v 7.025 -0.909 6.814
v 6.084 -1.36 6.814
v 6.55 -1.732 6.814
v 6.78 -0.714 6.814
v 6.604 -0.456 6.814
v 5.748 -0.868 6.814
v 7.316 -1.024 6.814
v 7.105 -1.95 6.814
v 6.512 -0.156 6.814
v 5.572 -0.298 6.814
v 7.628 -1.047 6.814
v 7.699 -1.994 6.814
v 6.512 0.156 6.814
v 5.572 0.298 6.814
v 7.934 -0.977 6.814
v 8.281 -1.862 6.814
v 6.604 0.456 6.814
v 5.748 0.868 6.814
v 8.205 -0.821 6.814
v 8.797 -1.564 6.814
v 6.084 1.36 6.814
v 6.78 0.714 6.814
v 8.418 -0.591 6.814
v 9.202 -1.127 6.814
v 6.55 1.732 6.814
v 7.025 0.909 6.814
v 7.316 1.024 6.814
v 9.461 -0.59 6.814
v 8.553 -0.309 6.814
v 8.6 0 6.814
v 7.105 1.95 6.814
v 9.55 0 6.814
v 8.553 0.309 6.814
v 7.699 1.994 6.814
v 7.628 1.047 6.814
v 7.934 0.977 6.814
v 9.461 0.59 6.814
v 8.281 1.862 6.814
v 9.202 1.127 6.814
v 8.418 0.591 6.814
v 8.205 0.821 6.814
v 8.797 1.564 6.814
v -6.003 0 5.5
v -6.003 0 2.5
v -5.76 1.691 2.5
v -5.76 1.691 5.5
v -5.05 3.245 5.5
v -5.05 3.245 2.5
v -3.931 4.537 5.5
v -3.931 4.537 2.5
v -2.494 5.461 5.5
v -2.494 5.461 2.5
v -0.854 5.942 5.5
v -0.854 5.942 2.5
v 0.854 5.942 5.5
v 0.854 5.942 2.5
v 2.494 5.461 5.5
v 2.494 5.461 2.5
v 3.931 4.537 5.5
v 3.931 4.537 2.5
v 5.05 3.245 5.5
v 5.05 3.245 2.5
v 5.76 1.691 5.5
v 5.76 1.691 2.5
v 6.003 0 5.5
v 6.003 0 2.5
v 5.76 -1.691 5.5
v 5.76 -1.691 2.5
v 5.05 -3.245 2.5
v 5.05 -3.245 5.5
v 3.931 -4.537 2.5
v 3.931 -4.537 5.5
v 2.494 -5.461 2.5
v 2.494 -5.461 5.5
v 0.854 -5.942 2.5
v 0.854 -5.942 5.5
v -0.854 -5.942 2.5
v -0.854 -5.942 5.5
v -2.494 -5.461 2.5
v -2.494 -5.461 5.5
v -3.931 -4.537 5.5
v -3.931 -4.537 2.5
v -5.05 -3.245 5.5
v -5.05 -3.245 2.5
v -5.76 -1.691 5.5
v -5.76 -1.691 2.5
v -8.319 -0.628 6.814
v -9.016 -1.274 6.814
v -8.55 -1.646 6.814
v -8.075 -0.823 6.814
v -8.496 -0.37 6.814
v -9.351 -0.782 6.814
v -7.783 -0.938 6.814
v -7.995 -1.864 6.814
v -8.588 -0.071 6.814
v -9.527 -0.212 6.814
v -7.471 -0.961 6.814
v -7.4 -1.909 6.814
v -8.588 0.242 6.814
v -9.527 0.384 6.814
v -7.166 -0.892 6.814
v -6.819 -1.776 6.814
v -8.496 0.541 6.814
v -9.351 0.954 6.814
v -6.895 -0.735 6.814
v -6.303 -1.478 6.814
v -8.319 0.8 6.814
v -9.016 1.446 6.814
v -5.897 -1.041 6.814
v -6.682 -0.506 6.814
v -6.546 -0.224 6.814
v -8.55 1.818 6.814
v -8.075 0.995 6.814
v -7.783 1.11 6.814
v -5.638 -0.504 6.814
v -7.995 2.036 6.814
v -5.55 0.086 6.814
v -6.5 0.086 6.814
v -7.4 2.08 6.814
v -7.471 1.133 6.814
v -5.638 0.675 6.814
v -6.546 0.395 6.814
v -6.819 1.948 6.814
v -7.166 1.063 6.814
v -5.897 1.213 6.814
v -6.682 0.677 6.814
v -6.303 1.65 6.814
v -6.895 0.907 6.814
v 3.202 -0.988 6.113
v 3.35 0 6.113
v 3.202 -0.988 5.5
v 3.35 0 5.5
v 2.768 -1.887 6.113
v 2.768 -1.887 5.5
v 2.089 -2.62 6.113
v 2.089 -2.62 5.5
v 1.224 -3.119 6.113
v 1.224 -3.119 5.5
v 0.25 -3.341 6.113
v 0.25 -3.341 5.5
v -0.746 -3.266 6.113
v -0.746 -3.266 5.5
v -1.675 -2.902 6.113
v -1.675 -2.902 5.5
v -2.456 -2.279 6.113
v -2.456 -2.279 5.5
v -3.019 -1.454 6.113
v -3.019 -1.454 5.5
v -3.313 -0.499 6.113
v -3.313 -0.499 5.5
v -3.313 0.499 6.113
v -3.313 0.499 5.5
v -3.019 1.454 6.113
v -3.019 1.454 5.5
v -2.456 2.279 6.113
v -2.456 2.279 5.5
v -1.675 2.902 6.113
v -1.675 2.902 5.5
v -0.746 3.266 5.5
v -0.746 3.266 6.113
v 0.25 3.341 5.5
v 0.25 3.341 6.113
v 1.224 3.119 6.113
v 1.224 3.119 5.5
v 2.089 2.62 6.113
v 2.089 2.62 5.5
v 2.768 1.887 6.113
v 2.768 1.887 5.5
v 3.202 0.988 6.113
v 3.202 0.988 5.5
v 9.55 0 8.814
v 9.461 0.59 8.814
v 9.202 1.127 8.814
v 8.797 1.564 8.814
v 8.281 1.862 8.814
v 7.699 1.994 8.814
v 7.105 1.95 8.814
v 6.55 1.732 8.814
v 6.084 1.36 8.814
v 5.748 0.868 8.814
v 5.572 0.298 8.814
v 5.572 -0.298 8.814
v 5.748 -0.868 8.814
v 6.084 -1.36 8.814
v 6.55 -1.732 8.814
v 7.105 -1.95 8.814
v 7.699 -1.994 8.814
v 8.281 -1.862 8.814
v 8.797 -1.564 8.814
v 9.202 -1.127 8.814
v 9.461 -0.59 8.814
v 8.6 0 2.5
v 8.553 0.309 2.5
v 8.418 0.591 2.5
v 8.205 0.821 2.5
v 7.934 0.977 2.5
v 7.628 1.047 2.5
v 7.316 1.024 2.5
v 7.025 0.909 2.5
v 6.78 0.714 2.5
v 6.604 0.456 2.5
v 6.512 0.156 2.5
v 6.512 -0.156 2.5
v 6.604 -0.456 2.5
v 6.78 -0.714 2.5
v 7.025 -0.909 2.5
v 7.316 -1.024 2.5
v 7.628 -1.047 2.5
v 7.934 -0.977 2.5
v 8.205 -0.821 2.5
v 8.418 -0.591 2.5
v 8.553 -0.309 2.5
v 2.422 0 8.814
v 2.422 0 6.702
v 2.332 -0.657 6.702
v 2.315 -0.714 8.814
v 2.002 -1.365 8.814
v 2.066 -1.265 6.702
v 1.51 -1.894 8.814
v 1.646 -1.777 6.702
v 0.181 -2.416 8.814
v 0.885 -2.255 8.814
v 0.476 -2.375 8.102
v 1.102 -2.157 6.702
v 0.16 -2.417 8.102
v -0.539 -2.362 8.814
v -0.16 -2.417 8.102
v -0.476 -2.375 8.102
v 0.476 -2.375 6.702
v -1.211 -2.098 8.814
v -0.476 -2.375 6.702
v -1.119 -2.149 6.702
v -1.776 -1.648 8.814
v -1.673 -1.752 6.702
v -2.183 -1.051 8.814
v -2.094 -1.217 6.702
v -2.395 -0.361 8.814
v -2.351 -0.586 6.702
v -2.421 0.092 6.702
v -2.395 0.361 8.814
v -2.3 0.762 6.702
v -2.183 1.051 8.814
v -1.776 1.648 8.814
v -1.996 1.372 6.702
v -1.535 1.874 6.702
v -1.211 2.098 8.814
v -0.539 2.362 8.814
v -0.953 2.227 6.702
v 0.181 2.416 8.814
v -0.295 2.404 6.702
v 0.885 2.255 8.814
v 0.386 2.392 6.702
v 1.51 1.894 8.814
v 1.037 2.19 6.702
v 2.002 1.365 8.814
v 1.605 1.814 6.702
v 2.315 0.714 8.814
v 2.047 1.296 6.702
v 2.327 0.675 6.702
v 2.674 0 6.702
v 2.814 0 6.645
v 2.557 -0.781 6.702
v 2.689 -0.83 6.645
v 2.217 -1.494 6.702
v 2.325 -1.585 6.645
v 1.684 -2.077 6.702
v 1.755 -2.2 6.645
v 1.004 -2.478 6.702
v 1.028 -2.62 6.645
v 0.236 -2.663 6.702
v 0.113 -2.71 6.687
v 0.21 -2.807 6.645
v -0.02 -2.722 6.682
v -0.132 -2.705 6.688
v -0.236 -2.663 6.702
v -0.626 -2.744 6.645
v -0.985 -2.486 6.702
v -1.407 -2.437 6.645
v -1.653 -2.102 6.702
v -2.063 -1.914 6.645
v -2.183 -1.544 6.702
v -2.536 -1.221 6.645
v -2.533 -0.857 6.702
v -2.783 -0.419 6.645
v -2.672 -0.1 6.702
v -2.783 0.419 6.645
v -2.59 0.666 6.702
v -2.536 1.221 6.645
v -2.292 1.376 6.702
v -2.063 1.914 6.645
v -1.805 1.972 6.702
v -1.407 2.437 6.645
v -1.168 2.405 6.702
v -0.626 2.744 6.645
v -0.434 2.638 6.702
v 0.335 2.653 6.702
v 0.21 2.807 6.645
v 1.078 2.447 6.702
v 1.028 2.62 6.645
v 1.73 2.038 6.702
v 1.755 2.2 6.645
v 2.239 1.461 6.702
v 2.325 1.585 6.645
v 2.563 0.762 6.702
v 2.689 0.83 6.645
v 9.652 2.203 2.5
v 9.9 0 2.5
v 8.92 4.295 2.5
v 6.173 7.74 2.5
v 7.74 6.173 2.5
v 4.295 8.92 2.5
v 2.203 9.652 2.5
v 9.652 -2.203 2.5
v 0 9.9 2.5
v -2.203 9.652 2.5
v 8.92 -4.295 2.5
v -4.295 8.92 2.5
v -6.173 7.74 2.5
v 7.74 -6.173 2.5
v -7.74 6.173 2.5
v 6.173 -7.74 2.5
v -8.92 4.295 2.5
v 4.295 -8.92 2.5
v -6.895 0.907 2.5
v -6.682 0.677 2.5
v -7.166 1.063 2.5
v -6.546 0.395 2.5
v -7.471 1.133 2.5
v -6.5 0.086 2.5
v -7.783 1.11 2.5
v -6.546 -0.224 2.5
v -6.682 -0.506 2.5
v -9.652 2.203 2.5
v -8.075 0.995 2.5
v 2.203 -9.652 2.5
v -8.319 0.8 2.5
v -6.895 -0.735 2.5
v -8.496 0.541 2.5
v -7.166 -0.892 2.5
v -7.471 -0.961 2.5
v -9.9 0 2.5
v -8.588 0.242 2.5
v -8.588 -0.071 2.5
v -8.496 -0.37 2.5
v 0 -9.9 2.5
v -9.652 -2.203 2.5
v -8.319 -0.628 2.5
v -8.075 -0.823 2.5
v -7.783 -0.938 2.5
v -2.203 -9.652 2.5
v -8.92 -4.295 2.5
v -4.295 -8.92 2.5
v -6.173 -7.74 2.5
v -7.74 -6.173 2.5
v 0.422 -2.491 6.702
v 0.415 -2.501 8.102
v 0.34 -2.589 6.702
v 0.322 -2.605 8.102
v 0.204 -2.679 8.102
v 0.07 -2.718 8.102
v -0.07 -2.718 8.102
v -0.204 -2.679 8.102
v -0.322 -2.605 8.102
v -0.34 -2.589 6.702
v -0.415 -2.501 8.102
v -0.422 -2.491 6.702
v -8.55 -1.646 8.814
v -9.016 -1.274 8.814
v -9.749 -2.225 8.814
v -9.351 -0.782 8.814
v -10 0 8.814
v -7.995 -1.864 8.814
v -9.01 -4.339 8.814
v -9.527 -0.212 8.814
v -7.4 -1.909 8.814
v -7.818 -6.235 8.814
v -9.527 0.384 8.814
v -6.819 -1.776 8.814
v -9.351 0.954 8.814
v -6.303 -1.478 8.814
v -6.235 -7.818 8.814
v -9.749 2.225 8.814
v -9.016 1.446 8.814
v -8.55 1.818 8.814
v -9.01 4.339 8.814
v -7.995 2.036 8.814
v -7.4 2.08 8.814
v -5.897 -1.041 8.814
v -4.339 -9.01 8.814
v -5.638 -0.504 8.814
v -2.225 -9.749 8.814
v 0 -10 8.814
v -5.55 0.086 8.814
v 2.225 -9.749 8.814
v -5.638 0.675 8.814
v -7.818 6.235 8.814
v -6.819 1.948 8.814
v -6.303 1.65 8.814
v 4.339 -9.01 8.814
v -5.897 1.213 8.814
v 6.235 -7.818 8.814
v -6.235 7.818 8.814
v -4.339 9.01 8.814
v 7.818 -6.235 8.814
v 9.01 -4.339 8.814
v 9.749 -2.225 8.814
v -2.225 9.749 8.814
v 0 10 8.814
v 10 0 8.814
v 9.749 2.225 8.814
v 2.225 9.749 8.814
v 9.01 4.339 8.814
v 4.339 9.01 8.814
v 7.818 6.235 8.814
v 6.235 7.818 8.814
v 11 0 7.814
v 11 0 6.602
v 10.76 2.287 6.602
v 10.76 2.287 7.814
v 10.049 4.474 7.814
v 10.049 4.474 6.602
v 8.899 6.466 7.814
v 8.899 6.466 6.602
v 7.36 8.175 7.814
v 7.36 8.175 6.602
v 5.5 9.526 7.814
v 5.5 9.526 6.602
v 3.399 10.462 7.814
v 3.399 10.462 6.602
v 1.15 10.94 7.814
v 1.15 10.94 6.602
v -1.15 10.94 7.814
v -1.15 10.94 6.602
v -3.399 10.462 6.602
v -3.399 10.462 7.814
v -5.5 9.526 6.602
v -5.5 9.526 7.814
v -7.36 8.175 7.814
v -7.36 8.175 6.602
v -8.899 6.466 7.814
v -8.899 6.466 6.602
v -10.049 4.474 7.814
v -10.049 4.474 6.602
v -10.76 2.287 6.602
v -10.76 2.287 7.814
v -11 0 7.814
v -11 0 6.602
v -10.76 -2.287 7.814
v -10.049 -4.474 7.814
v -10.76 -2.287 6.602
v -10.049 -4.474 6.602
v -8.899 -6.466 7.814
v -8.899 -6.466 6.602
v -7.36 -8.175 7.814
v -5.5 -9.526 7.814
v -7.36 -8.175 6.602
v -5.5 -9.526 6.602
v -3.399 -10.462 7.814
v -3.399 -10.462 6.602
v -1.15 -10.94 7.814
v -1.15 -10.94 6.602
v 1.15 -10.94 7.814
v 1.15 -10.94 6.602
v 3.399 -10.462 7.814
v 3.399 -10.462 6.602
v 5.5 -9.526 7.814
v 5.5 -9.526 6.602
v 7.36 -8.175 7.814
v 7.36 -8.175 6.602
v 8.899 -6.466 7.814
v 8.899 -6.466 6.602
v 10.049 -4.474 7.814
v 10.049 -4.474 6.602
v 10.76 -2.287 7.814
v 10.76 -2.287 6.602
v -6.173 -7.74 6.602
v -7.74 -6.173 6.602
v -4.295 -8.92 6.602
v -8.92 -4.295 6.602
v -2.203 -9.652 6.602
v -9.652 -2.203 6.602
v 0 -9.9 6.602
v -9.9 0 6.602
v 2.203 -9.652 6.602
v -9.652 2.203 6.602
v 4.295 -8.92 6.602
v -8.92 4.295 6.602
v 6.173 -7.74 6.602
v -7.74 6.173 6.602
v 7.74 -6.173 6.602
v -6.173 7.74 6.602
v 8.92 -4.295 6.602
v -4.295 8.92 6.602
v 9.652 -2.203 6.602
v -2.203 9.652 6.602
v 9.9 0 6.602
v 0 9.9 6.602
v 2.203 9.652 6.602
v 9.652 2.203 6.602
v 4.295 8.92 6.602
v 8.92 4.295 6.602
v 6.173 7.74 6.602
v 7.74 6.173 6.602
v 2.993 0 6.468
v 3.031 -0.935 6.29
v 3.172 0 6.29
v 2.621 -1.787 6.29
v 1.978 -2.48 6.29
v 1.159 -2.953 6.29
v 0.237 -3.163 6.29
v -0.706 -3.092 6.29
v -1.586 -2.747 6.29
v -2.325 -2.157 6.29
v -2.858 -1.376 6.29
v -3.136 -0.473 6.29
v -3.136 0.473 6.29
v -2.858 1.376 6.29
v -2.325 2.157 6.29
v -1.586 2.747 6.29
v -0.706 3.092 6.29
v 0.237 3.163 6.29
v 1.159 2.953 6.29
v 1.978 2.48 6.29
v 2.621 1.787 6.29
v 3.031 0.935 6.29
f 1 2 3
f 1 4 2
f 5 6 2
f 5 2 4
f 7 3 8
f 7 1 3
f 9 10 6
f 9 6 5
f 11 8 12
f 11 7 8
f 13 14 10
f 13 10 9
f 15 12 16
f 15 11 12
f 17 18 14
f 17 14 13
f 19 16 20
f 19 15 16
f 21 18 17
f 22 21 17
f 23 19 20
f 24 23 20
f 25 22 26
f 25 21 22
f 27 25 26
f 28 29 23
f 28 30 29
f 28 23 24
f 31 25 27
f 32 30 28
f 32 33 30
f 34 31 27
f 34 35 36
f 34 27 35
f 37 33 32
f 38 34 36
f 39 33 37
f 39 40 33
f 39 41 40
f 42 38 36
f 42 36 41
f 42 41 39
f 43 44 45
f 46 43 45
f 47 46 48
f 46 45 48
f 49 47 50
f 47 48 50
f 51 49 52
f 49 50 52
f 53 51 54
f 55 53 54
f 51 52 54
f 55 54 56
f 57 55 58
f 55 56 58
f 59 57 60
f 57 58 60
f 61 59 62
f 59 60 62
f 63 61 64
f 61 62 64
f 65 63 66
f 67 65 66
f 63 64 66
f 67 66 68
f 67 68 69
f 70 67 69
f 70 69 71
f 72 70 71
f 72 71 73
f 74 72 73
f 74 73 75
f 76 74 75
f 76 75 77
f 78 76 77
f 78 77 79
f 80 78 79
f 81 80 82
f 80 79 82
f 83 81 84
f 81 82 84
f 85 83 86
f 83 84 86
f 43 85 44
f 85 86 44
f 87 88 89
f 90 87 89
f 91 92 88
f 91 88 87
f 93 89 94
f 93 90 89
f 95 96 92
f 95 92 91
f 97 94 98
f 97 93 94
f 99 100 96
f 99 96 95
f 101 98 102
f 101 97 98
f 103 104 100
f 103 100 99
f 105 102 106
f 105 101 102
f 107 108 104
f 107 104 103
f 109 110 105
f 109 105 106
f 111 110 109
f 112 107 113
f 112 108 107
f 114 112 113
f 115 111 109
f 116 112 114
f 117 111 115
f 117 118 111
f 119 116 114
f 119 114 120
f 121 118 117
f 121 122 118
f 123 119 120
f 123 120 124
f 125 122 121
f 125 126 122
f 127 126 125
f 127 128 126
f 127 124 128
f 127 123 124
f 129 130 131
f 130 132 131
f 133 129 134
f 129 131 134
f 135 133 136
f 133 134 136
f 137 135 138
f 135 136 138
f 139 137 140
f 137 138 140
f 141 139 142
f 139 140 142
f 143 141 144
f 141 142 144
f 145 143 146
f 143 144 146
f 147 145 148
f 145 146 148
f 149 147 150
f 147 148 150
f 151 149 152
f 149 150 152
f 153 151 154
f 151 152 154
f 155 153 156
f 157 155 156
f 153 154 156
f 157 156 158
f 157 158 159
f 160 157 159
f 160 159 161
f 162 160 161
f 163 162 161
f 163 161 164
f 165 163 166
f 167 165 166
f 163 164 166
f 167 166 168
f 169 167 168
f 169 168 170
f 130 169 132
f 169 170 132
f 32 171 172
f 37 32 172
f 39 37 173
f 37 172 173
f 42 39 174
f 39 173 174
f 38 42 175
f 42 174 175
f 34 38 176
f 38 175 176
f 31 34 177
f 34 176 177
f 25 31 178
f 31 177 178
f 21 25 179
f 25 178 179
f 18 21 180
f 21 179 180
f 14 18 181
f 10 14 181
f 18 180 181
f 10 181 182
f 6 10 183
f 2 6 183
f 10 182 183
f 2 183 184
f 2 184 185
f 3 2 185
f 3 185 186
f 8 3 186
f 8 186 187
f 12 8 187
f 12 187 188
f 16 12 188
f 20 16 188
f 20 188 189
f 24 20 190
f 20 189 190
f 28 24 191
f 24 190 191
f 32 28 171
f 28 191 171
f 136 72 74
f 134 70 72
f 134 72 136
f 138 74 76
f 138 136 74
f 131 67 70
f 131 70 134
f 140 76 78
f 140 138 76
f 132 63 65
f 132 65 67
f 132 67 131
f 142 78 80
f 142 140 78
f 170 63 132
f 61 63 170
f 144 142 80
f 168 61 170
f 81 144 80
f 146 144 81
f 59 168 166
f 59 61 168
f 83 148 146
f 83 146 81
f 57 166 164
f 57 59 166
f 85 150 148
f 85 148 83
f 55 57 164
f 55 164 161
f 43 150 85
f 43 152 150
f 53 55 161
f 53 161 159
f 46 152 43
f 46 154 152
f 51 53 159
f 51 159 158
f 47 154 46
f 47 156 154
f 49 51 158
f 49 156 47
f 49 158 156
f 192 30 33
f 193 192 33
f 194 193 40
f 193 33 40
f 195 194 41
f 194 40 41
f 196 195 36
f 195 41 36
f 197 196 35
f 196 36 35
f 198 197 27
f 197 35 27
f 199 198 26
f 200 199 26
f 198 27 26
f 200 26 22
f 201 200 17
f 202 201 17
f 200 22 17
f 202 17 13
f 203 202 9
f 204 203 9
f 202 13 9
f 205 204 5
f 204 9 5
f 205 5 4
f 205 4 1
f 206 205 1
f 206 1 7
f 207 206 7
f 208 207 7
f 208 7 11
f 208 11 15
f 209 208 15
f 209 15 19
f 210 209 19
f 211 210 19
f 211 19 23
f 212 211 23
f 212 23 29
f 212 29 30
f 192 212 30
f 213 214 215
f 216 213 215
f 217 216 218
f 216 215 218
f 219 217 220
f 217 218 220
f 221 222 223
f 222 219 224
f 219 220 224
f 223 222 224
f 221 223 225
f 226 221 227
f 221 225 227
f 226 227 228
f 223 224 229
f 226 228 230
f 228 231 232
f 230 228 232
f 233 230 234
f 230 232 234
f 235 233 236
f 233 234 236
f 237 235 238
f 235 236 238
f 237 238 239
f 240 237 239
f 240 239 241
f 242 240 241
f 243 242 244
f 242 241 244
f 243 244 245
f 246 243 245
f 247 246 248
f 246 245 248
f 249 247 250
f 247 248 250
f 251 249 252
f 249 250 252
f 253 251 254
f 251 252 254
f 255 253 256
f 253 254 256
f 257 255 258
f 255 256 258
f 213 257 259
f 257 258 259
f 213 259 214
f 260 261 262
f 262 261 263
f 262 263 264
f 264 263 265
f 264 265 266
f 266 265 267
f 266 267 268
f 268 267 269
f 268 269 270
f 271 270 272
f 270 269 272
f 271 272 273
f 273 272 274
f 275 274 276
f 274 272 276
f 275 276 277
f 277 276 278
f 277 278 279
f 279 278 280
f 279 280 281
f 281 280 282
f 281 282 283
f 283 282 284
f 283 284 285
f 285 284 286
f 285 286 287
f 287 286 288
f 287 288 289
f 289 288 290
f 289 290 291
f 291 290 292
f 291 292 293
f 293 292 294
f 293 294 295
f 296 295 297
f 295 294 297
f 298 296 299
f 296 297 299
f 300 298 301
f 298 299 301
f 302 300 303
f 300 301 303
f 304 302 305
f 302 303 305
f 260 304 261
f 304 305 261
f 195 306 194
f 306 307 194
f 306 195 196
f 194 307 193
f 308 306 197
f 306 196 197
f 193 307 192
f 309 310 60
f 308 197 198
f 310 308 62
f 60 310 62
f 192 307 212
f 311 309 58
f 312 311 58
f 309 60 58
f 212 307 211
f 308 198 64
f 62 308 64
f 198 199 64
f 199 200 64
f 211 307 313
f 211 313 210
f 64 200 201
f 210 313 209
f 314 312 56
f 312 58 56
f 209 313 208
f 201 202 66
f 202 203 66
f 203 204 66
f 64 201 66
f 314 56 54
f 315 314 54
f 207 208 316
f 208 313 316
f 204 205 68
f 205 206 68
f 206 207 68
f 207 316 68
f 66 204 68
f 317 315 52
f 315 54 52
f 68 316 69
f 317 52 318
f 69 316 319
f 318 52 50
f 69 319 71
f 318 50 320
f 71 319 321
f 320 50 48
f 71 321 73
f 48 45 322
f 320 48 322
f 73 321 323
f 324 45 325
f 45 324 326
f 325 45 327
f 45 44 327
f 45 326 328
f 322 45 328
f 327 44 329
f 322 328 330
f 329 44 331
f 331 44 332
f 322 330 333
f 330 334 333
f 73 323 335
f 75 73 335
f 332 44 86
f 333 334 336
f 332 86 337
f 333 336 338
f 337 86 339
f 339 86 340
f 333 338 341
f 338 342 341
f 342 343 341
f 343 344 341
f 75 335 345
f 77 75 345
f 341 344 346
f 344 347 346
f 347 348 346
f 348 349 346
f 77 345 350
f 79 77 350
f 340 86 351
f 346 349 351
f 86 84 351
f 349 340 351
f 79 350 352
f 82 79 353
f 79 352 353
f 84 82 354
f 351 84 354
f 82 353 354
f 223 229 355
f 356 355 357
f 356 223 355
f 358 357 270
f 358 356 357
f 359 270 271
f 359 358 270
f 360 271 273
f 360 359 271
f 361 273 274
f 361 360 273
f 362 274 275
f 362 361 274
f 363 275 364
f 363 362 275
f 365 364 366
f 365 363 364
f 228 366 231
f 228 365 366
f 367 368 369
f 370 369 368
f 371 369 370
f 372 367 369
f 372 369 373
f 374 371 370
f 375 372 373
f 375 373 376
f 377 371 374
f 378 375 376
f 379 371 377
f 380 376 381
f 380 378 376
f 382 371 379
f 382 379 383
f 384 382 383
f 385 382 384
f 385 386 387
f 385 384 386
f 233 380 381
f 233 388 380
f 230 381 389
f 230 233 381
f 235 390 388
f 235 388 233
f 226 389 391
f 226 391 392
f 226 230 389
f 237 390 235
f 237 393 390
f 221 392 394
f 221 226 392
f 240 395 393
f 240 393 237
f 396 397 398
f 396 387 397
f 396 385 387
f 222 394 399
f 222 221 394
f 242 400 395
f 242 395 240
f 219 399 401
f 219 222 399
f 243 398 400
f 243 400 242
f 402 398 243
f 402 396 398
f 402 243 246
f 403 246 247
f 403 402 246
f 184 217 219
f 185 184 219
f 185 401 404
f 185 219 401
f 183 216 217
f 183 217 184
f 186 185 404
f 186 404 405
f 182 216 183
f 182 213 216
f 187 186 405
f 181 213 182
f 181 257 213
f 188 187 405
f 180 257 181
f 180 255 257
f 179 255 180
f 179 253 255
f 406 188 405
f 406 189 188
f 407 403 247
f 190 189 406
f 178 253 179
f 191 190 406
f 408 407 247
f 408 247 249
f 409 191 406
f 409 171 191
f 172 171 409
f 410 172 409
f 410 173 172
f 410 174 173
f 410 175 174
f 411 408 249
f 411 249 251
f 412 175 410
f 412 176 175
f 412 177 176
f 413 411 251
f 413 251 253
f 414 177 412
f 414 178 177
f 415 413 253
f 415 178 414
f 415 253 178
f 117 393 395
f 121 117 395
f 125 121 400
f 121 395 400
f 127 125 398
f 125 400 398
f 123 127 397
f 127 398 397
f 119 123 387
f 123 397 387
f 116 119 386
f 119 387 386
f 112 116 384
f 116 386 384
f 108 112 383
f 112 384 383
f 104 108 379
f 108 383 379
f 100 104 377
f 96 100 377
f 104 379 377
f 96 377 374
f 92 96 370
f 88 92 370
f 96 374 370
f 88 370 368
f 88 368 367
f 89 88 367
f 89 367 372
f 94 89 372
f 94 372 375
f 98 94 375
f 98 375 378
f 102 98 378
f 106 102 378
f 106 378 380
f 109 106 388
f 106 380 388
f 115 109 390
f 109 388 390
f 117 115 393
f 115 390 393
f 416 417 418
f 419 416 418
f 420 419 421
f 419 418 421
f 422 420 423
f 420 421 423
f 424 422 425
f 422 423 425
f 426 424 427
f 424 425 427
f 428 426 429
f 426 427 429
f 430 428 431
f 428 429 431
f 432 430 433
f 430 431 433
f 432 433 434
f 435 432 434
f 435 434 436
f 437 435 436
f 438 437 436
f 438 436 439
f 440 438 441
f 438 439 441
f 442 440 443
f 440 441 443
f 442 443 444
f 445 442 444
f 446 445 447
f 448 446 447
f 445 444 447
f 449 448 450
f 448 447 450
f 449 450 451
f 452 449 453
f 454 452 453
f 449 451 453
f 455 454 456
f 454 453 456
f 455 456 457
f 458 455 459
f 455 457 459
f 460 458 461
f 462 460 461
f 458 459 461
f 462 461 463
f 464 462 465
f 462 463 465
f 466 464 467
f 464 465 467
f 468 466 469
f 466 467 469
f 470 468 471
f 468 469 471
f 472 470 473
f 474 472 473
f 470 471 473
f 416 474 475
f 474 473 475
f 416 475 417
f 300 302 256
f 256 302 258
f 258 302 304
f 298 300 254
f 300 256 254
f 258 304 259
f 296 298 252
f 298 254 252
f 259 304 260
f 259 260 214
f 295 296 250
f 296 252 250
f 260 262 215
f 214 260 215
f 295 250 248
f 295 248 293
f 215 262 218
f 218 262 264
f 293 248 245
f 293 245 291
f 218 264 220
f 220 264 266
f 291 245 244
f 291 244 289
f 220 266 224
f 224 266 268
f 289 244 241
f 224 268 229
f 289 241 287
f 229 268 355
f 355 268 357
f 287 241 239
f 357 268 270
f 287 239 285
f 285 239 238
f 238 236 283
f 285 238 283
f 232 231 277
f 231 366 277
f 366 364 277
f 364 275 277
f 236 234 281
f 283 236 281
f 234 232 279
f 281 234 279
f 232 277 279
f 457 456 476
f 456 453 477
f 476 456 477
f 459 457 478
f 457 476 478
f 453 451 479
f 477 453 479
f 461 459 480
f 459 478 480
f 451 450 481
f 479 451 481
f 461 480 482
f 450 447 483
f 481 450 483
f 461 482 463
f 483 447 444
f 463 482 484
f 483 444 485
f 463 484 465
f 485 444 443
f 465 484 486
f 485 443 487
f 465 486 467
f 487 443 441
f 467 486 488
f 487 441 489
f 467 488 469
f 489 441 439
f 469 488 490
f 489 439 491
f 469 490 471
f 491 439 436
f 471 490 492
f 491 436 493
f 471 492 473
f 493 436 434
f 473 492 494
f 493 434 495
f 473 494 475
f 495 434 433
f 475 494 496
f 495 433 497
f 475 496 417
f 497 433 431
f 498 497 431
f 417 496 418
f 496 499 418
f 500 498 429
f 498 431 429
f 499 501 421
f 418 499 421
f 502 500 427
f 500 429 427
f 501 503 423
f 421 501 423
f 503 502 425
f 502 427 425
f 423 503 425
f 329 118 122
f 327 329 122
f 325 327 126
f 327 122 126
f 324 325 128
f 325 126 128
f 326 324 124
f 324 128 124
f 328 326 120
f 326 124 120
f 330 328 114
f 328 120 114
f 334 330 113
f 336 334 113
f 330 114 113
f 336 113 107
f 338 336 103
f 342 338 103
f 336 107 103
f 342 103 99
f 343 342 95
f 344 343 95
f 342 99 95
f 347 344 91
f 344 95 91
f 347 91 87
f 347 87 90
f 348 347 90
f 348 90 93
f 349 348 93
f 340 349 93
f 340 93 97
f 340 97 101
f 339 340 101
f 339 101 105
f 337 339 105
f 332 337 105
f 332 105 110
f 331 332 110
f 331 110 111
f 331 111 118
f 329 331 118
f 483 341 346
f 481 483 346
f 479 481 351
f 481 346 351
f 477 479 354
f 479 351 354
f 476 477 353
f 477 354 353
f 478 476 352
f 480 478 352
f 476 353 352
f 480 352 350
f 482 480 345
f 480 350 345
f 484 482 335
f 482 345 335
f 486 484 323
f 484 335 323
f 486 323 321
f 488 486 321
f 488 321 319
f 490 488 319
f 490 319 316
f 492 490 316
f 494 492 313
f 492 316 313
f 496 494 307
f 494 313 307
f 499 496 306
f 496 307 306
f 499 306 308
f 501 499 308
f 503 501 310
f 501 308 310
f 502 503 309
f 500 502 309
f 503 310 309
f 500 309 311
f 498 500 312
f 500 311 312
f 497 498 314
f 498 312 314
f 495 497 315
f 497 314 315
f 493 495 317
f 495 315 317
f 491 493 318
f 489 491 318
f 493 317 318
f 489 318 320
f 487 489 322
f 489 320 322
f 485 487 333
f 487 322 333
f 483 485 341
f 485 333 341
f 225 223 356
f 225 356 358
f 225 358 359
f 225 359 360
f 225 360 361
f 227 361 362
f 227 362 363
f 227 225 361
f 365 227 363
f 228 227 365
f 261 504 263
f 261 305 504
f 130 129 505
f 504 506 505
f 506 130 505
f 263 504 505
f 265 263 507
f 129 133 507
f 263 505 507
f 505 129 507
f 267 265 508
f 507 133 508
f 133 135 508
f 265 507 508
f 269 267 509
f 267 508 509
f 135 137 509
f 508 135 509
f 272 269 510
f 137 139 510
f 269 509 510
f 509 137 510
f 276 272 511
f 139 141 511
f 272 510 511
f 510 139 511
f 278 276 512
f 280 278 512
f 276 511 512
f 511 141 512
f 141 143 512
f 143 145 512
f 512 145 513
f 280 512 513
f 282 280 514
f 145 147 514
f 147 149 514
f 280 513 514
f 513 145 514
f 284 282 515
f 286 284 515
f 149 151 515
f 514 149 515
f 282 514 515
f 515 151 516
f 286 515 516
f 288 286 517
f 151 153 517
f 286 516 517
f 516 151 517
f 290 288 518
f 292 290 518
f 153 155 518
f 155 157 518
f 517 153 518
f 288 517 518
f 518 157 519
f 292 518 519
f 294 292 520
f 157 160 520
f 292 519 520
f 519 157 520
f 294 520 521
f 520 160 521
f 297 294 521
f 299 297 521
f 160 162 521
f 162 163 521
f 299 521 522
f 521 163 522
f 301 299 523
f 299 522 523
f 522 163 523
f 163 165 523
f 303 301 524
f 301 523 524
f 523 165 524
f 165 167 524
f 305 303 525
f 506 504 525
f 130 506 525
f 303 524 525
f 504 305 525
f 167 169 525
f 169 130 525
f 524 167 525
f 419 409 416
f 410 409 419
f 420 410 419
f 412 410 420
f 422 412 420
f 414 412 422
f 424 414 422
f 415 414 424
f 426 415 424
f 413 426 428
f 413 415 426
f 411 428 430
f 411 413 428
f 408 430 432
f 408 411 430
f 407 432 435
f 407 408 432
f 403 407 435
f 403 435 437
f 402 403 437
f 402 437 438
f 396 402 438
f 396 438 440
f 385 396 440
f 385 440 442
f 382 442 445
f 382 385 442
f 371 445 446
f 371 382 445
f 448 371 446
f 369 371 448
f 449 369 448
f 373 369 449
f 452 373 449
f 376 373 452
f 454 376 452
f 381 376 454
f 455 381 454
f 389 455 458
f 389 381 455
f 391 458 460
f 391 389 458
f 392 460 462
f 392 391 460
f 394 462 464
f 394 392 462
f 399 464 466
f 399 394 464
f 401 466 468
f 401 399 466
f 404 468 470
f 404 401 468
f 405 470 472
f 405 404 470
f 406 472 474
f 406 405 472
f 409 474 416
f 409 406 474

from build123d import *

# Parameters (mm, degrees)
SKETCH1_R               = 9.9
BOSS_EXTRUDE1_DEPTH     = 4.1024
SKETCH3_R               = 11
BOSS_EXTRUDE2_DEPTH     = 2.2114
CUT_EXTRUDE1_DEPTH      = 17.088184663
CUT_EXTRUDE1_DEPTH_BACK = 1.5
SKETCH6_R               = 0.5
CHAMFER1_SIZE           = 1
SKETCH7_R               = 2
CUT_EXTRUDE2_DEPTH      = 2
SKETCH8_R               = 1.05
CUT_EXTRUDE3_DEPTH      = 17.143384727
SKETCH9_R               = 6.003028119
CUT_EXTRUDE4_DEPTH      = 3


with BuildPart() as part:
    # Sketch1 → Boss-Extrude1 (new body)
    with BuildSketch(Plane.XY.offset(2.5)):
        with Locations(Location((0, 0, 0), (0, 0, 180))):
            Circle(SKETCH1_R)
    extrude(amount=BOSS_EXTRUDE1_DEPTH)

    # Sketch3 → Boss-Extrude2 (add)
    with BuildSketch(Plane.XY.offset(6.6024)):
        Circle(SKETCH3_R)
    extrude(amount=BOSS_EXTRUDE2_DEPTH)

    # Sketch4 → Cut-Revolve2 (revolve, cut)
    with BuildSketch(Plane(origin=(0, 0, 0), x_dir=(0, 0, -1), z_dir=(1, 0, 0)), mode=Mode.PRIVATE) as cut_revolve2_sk:
        with BuildLine():
            Line((-6.113239385, 3.350496042), (0, 3.350496042))
            Line((0, 3.350496042), (0, 0))
            Line((0, 0), (-8.8138, 0))
            Line((-8.8138, 0), (-8.8138, 2.4225))
            Line((-8.8138, 2.4225), (-6.7024, 2.4225))
            Line((-6.7024, 2.4225), (-6.7024, 2.673729766))
            Line((-6.7024, 2.673729766), (-6.644568783, 2.814399725))
            ThreePointArc((-6.644568783, 2.814399725), (-6.379015778, 3.082558584), (-6.113239385, 3.350496042))
        make_face()
    revolve(cut_revolve2_sk.sketch.rotate(Axis((0, 0, 8.8138), (0, 0, -1)), 90), axis=Axis((0, 0, 8.8138), (0, 0, -1)), mode=Mode.SUBTRACT)

    # Sketch6 → Cut-Extrude1 (cut, two sides: drawn at the far end of the back side and taken through both)
    with BuildSketch(Plane(origin=(0, 0, 6.6024), x_dir=(-1, 0, 0), z_dir=(0, 0, -1)).offset(-CUT_EXTRUDE1_DEPTH_BACK)):
        with Locations((1.2e-08, -2.2225)):
            Circle(SKETCH6_R)
    extrude(amount=CUT_EXTRUDE1_DEPTH + CUT_EXTRUDE1_DEPTH_BACK, mode=Mode.SUBTRACT)

    # Chamfer1
    chamfer1_edges = [part.edges().sort_by_distance(p)[0] for p in [
        (-11, 0, 8.8138),
    ]]
    chamfer(chamfer1_edges, length=CHAMFER1_SIZE)

    # Sketch7 → Cut-Extrude2 (cut)
    with BuildSketch(Plane.XY.offset(8.8138)):
        with Locations((-7.549511775, 0.085860102)):
            Circle(SKETCH7_R)
        with Locations((7.55, 0)):
            Circle(SKETCH7_R)
    extrude(amount=-CUT_EXTRUDE2_DEPTH, mode=Mode.SUBTRACT)

    # Sketch8 → Cut-Extrude3 (cut, through all)
    with BuildSketch(Plane.XY.offset(6.8138)):
        with Locations((-7.549511775, 0.085860102)):
            Circle(SKETCH8_R)
        with Locations((7.55, 0)):
            Circle(SKETCH8_R)
    extrude(amount=-CUT_EXTRUDE3_DEPTH, mode=Mode.SUBTRACT)

    # Sketch9 → Cut-Extrude4 (cut)
    with BuildSketch(Plane(origin=(0, 0, 2.5), x_dir=(-1, 0, 0), z_dir=(0, 0, -1))):
        Circle(SKETCH9_R)
    extrude(amount=-CUT_EXTRUDE4_DEPTH, mode=Mode.SUBTRACT)


solid = part.part
